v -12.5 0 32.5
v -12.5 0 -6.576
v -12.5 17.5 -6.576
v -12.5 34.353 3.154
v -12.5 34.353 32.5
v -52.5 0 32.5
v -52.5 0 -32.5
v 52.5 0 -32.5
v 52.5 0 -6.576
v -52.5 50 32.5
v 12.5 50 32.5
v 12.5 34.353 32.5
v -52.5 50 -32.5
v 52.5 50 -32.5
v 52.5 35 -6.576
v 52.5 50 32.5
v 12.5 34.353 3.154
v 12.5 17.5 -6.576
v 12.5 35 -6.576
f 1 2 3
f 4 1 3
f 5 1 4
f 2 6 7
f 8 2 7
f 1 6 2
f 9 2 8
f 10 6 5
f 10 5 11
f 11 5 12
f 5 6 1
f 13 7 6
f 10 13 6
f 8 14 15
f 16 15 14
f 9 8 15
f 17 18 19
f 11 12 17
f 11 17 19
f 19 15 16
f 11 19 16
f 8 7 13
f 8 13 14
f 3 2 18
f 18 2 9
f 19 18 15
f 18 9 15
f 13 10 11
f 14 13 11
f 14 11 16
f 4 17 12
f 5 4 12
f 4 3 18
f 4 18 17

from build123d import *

# Parameters (mm, degrees)
F0_W     = 105
F0_H     = 65
F1_DEPTH = 50
F3_DEPTH = 40
F5_DEPTH = 25
F6_DEPTH = 25
F7_DEPTH = 25


# Not quite as in the source:
# - a feature names something its author has since deleted; it is built from what else it names


with BuildPart() as f1:
    # F0 (on Front) → F1 (new body)
    with BuildSketch(Plane.XZ):
        Rectangle(F0_W, F0_H)
    extrude(amount=-F1_DEPTH)

    # F2 (on face) → F3 (cut)
    with BuildSketch(Plane.YZ.offset(52.5)):
        Polygon((0, 32.5), (0, -6.5763359704), (35, -6.5763359704), (50, 32.5), align=None)
    extrude(amount=-F3_DEPTH, mode=Mode.SUBTRACT)

    # F4 (on face) → F5 (join)
    with BuildSketch(Plane.YZ.offset(12.5)):
        Polygon((34.35340128, 3.1539797953), (34.35340128, 32.5), (0, 32.5), (0, -6.5763359704), (17.5, -6.5763359704), align=None)
    extrude(amount=-F5_DEPTH)

    # F4 (on face) → F6 (join)
    with BuildSketch(Plane.YZ.offset(12.5)):
        Polygon((34.35340128, 3.1539797953), (34.35340128, 32.5), (0, 32.5), (0, -6.5763359704), (17.5, -6.5763359704), align=None)
    extrude(amount=-F6_DEPTH)

    # F4 (on face) → F7 (cut)
    with BuildSketch(Plane.YZ.offset(12.5)):
        Polygon((34.35340128, 3.1539797953), (34.35340128, 32.5), (0, 32.5), (0, -6.5763359704), (17.5, -6.5763359704), align=None)
    extrude(amount=-F7_DEPTH, mode=Mode.SUBTRACT)


solid = f1.part
